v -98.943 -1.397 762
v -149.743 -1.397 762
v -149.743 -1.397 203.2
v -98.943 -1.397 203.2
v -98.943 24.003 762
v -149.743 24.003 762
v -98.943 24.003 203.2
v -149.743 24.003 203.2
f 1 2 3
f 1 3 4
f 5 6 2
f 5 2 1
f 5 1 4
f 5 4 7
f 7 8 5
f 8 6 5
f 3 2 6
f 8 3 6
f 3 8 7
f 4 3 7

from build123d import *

# Parameters (mm, degrees)
F0_W     = 50.8
F0_H     = 25.4
F1_DEPTH = 762
F2_DEPTH = 25.4
F3_DEPTH = 127
F4_DEPTH = 101.6
F5_DEPTH = 50.8


with BuildPart() as f1:
    # F0 (on Top) → F1 (new body)
    with BuildSketch(Plane.XY):
        with Locations((-124.3431291819, 11.3030608416)):
            Rectangle(F0_W, F0_H)
    extrude(amount=F1_DEPTH)

    # F2 (cut): a face of the model
    f2_faces = [f1.faces().sort_by_distance(p)[0] for p in [
        (-124.3431291819, 11.3030608416, 0),
    ]]
    extrude(f2_faces, amount=-F2_DEPTH, mode=Mode.SUBTRACT)

    # F3 (cut): a face of the model
    f3_faces = [f1.faces().sort_by_distance(p)[0] for p in [
        (-124.3431291819, 11.3030608416, 25.4),
    ]]
    extrude(f3_faces, amount=-F3_DEPTH, mode=Mode.SUBTRACT)

    # F4 (cut): a face of the model
    f4_faces = [f1.faces().sort_by_distance(p)[0] for p in [
        (-124.3431291819, 11.3030608416, 152.4),
    ]]
    extrude(f4_faces, amount=-F4_DEPTH, mode=Mode.SUBTRACT)

    # F5 (add): a face of the model
    f5_faces = [f1.faces().sort_by_distance(p)[0] for p in [
        (-124.3431291819, 11.3030608416, 254),
    ]]
    extrude(f5_faces, amount=F5_DEPTH)


solid = f1.part
